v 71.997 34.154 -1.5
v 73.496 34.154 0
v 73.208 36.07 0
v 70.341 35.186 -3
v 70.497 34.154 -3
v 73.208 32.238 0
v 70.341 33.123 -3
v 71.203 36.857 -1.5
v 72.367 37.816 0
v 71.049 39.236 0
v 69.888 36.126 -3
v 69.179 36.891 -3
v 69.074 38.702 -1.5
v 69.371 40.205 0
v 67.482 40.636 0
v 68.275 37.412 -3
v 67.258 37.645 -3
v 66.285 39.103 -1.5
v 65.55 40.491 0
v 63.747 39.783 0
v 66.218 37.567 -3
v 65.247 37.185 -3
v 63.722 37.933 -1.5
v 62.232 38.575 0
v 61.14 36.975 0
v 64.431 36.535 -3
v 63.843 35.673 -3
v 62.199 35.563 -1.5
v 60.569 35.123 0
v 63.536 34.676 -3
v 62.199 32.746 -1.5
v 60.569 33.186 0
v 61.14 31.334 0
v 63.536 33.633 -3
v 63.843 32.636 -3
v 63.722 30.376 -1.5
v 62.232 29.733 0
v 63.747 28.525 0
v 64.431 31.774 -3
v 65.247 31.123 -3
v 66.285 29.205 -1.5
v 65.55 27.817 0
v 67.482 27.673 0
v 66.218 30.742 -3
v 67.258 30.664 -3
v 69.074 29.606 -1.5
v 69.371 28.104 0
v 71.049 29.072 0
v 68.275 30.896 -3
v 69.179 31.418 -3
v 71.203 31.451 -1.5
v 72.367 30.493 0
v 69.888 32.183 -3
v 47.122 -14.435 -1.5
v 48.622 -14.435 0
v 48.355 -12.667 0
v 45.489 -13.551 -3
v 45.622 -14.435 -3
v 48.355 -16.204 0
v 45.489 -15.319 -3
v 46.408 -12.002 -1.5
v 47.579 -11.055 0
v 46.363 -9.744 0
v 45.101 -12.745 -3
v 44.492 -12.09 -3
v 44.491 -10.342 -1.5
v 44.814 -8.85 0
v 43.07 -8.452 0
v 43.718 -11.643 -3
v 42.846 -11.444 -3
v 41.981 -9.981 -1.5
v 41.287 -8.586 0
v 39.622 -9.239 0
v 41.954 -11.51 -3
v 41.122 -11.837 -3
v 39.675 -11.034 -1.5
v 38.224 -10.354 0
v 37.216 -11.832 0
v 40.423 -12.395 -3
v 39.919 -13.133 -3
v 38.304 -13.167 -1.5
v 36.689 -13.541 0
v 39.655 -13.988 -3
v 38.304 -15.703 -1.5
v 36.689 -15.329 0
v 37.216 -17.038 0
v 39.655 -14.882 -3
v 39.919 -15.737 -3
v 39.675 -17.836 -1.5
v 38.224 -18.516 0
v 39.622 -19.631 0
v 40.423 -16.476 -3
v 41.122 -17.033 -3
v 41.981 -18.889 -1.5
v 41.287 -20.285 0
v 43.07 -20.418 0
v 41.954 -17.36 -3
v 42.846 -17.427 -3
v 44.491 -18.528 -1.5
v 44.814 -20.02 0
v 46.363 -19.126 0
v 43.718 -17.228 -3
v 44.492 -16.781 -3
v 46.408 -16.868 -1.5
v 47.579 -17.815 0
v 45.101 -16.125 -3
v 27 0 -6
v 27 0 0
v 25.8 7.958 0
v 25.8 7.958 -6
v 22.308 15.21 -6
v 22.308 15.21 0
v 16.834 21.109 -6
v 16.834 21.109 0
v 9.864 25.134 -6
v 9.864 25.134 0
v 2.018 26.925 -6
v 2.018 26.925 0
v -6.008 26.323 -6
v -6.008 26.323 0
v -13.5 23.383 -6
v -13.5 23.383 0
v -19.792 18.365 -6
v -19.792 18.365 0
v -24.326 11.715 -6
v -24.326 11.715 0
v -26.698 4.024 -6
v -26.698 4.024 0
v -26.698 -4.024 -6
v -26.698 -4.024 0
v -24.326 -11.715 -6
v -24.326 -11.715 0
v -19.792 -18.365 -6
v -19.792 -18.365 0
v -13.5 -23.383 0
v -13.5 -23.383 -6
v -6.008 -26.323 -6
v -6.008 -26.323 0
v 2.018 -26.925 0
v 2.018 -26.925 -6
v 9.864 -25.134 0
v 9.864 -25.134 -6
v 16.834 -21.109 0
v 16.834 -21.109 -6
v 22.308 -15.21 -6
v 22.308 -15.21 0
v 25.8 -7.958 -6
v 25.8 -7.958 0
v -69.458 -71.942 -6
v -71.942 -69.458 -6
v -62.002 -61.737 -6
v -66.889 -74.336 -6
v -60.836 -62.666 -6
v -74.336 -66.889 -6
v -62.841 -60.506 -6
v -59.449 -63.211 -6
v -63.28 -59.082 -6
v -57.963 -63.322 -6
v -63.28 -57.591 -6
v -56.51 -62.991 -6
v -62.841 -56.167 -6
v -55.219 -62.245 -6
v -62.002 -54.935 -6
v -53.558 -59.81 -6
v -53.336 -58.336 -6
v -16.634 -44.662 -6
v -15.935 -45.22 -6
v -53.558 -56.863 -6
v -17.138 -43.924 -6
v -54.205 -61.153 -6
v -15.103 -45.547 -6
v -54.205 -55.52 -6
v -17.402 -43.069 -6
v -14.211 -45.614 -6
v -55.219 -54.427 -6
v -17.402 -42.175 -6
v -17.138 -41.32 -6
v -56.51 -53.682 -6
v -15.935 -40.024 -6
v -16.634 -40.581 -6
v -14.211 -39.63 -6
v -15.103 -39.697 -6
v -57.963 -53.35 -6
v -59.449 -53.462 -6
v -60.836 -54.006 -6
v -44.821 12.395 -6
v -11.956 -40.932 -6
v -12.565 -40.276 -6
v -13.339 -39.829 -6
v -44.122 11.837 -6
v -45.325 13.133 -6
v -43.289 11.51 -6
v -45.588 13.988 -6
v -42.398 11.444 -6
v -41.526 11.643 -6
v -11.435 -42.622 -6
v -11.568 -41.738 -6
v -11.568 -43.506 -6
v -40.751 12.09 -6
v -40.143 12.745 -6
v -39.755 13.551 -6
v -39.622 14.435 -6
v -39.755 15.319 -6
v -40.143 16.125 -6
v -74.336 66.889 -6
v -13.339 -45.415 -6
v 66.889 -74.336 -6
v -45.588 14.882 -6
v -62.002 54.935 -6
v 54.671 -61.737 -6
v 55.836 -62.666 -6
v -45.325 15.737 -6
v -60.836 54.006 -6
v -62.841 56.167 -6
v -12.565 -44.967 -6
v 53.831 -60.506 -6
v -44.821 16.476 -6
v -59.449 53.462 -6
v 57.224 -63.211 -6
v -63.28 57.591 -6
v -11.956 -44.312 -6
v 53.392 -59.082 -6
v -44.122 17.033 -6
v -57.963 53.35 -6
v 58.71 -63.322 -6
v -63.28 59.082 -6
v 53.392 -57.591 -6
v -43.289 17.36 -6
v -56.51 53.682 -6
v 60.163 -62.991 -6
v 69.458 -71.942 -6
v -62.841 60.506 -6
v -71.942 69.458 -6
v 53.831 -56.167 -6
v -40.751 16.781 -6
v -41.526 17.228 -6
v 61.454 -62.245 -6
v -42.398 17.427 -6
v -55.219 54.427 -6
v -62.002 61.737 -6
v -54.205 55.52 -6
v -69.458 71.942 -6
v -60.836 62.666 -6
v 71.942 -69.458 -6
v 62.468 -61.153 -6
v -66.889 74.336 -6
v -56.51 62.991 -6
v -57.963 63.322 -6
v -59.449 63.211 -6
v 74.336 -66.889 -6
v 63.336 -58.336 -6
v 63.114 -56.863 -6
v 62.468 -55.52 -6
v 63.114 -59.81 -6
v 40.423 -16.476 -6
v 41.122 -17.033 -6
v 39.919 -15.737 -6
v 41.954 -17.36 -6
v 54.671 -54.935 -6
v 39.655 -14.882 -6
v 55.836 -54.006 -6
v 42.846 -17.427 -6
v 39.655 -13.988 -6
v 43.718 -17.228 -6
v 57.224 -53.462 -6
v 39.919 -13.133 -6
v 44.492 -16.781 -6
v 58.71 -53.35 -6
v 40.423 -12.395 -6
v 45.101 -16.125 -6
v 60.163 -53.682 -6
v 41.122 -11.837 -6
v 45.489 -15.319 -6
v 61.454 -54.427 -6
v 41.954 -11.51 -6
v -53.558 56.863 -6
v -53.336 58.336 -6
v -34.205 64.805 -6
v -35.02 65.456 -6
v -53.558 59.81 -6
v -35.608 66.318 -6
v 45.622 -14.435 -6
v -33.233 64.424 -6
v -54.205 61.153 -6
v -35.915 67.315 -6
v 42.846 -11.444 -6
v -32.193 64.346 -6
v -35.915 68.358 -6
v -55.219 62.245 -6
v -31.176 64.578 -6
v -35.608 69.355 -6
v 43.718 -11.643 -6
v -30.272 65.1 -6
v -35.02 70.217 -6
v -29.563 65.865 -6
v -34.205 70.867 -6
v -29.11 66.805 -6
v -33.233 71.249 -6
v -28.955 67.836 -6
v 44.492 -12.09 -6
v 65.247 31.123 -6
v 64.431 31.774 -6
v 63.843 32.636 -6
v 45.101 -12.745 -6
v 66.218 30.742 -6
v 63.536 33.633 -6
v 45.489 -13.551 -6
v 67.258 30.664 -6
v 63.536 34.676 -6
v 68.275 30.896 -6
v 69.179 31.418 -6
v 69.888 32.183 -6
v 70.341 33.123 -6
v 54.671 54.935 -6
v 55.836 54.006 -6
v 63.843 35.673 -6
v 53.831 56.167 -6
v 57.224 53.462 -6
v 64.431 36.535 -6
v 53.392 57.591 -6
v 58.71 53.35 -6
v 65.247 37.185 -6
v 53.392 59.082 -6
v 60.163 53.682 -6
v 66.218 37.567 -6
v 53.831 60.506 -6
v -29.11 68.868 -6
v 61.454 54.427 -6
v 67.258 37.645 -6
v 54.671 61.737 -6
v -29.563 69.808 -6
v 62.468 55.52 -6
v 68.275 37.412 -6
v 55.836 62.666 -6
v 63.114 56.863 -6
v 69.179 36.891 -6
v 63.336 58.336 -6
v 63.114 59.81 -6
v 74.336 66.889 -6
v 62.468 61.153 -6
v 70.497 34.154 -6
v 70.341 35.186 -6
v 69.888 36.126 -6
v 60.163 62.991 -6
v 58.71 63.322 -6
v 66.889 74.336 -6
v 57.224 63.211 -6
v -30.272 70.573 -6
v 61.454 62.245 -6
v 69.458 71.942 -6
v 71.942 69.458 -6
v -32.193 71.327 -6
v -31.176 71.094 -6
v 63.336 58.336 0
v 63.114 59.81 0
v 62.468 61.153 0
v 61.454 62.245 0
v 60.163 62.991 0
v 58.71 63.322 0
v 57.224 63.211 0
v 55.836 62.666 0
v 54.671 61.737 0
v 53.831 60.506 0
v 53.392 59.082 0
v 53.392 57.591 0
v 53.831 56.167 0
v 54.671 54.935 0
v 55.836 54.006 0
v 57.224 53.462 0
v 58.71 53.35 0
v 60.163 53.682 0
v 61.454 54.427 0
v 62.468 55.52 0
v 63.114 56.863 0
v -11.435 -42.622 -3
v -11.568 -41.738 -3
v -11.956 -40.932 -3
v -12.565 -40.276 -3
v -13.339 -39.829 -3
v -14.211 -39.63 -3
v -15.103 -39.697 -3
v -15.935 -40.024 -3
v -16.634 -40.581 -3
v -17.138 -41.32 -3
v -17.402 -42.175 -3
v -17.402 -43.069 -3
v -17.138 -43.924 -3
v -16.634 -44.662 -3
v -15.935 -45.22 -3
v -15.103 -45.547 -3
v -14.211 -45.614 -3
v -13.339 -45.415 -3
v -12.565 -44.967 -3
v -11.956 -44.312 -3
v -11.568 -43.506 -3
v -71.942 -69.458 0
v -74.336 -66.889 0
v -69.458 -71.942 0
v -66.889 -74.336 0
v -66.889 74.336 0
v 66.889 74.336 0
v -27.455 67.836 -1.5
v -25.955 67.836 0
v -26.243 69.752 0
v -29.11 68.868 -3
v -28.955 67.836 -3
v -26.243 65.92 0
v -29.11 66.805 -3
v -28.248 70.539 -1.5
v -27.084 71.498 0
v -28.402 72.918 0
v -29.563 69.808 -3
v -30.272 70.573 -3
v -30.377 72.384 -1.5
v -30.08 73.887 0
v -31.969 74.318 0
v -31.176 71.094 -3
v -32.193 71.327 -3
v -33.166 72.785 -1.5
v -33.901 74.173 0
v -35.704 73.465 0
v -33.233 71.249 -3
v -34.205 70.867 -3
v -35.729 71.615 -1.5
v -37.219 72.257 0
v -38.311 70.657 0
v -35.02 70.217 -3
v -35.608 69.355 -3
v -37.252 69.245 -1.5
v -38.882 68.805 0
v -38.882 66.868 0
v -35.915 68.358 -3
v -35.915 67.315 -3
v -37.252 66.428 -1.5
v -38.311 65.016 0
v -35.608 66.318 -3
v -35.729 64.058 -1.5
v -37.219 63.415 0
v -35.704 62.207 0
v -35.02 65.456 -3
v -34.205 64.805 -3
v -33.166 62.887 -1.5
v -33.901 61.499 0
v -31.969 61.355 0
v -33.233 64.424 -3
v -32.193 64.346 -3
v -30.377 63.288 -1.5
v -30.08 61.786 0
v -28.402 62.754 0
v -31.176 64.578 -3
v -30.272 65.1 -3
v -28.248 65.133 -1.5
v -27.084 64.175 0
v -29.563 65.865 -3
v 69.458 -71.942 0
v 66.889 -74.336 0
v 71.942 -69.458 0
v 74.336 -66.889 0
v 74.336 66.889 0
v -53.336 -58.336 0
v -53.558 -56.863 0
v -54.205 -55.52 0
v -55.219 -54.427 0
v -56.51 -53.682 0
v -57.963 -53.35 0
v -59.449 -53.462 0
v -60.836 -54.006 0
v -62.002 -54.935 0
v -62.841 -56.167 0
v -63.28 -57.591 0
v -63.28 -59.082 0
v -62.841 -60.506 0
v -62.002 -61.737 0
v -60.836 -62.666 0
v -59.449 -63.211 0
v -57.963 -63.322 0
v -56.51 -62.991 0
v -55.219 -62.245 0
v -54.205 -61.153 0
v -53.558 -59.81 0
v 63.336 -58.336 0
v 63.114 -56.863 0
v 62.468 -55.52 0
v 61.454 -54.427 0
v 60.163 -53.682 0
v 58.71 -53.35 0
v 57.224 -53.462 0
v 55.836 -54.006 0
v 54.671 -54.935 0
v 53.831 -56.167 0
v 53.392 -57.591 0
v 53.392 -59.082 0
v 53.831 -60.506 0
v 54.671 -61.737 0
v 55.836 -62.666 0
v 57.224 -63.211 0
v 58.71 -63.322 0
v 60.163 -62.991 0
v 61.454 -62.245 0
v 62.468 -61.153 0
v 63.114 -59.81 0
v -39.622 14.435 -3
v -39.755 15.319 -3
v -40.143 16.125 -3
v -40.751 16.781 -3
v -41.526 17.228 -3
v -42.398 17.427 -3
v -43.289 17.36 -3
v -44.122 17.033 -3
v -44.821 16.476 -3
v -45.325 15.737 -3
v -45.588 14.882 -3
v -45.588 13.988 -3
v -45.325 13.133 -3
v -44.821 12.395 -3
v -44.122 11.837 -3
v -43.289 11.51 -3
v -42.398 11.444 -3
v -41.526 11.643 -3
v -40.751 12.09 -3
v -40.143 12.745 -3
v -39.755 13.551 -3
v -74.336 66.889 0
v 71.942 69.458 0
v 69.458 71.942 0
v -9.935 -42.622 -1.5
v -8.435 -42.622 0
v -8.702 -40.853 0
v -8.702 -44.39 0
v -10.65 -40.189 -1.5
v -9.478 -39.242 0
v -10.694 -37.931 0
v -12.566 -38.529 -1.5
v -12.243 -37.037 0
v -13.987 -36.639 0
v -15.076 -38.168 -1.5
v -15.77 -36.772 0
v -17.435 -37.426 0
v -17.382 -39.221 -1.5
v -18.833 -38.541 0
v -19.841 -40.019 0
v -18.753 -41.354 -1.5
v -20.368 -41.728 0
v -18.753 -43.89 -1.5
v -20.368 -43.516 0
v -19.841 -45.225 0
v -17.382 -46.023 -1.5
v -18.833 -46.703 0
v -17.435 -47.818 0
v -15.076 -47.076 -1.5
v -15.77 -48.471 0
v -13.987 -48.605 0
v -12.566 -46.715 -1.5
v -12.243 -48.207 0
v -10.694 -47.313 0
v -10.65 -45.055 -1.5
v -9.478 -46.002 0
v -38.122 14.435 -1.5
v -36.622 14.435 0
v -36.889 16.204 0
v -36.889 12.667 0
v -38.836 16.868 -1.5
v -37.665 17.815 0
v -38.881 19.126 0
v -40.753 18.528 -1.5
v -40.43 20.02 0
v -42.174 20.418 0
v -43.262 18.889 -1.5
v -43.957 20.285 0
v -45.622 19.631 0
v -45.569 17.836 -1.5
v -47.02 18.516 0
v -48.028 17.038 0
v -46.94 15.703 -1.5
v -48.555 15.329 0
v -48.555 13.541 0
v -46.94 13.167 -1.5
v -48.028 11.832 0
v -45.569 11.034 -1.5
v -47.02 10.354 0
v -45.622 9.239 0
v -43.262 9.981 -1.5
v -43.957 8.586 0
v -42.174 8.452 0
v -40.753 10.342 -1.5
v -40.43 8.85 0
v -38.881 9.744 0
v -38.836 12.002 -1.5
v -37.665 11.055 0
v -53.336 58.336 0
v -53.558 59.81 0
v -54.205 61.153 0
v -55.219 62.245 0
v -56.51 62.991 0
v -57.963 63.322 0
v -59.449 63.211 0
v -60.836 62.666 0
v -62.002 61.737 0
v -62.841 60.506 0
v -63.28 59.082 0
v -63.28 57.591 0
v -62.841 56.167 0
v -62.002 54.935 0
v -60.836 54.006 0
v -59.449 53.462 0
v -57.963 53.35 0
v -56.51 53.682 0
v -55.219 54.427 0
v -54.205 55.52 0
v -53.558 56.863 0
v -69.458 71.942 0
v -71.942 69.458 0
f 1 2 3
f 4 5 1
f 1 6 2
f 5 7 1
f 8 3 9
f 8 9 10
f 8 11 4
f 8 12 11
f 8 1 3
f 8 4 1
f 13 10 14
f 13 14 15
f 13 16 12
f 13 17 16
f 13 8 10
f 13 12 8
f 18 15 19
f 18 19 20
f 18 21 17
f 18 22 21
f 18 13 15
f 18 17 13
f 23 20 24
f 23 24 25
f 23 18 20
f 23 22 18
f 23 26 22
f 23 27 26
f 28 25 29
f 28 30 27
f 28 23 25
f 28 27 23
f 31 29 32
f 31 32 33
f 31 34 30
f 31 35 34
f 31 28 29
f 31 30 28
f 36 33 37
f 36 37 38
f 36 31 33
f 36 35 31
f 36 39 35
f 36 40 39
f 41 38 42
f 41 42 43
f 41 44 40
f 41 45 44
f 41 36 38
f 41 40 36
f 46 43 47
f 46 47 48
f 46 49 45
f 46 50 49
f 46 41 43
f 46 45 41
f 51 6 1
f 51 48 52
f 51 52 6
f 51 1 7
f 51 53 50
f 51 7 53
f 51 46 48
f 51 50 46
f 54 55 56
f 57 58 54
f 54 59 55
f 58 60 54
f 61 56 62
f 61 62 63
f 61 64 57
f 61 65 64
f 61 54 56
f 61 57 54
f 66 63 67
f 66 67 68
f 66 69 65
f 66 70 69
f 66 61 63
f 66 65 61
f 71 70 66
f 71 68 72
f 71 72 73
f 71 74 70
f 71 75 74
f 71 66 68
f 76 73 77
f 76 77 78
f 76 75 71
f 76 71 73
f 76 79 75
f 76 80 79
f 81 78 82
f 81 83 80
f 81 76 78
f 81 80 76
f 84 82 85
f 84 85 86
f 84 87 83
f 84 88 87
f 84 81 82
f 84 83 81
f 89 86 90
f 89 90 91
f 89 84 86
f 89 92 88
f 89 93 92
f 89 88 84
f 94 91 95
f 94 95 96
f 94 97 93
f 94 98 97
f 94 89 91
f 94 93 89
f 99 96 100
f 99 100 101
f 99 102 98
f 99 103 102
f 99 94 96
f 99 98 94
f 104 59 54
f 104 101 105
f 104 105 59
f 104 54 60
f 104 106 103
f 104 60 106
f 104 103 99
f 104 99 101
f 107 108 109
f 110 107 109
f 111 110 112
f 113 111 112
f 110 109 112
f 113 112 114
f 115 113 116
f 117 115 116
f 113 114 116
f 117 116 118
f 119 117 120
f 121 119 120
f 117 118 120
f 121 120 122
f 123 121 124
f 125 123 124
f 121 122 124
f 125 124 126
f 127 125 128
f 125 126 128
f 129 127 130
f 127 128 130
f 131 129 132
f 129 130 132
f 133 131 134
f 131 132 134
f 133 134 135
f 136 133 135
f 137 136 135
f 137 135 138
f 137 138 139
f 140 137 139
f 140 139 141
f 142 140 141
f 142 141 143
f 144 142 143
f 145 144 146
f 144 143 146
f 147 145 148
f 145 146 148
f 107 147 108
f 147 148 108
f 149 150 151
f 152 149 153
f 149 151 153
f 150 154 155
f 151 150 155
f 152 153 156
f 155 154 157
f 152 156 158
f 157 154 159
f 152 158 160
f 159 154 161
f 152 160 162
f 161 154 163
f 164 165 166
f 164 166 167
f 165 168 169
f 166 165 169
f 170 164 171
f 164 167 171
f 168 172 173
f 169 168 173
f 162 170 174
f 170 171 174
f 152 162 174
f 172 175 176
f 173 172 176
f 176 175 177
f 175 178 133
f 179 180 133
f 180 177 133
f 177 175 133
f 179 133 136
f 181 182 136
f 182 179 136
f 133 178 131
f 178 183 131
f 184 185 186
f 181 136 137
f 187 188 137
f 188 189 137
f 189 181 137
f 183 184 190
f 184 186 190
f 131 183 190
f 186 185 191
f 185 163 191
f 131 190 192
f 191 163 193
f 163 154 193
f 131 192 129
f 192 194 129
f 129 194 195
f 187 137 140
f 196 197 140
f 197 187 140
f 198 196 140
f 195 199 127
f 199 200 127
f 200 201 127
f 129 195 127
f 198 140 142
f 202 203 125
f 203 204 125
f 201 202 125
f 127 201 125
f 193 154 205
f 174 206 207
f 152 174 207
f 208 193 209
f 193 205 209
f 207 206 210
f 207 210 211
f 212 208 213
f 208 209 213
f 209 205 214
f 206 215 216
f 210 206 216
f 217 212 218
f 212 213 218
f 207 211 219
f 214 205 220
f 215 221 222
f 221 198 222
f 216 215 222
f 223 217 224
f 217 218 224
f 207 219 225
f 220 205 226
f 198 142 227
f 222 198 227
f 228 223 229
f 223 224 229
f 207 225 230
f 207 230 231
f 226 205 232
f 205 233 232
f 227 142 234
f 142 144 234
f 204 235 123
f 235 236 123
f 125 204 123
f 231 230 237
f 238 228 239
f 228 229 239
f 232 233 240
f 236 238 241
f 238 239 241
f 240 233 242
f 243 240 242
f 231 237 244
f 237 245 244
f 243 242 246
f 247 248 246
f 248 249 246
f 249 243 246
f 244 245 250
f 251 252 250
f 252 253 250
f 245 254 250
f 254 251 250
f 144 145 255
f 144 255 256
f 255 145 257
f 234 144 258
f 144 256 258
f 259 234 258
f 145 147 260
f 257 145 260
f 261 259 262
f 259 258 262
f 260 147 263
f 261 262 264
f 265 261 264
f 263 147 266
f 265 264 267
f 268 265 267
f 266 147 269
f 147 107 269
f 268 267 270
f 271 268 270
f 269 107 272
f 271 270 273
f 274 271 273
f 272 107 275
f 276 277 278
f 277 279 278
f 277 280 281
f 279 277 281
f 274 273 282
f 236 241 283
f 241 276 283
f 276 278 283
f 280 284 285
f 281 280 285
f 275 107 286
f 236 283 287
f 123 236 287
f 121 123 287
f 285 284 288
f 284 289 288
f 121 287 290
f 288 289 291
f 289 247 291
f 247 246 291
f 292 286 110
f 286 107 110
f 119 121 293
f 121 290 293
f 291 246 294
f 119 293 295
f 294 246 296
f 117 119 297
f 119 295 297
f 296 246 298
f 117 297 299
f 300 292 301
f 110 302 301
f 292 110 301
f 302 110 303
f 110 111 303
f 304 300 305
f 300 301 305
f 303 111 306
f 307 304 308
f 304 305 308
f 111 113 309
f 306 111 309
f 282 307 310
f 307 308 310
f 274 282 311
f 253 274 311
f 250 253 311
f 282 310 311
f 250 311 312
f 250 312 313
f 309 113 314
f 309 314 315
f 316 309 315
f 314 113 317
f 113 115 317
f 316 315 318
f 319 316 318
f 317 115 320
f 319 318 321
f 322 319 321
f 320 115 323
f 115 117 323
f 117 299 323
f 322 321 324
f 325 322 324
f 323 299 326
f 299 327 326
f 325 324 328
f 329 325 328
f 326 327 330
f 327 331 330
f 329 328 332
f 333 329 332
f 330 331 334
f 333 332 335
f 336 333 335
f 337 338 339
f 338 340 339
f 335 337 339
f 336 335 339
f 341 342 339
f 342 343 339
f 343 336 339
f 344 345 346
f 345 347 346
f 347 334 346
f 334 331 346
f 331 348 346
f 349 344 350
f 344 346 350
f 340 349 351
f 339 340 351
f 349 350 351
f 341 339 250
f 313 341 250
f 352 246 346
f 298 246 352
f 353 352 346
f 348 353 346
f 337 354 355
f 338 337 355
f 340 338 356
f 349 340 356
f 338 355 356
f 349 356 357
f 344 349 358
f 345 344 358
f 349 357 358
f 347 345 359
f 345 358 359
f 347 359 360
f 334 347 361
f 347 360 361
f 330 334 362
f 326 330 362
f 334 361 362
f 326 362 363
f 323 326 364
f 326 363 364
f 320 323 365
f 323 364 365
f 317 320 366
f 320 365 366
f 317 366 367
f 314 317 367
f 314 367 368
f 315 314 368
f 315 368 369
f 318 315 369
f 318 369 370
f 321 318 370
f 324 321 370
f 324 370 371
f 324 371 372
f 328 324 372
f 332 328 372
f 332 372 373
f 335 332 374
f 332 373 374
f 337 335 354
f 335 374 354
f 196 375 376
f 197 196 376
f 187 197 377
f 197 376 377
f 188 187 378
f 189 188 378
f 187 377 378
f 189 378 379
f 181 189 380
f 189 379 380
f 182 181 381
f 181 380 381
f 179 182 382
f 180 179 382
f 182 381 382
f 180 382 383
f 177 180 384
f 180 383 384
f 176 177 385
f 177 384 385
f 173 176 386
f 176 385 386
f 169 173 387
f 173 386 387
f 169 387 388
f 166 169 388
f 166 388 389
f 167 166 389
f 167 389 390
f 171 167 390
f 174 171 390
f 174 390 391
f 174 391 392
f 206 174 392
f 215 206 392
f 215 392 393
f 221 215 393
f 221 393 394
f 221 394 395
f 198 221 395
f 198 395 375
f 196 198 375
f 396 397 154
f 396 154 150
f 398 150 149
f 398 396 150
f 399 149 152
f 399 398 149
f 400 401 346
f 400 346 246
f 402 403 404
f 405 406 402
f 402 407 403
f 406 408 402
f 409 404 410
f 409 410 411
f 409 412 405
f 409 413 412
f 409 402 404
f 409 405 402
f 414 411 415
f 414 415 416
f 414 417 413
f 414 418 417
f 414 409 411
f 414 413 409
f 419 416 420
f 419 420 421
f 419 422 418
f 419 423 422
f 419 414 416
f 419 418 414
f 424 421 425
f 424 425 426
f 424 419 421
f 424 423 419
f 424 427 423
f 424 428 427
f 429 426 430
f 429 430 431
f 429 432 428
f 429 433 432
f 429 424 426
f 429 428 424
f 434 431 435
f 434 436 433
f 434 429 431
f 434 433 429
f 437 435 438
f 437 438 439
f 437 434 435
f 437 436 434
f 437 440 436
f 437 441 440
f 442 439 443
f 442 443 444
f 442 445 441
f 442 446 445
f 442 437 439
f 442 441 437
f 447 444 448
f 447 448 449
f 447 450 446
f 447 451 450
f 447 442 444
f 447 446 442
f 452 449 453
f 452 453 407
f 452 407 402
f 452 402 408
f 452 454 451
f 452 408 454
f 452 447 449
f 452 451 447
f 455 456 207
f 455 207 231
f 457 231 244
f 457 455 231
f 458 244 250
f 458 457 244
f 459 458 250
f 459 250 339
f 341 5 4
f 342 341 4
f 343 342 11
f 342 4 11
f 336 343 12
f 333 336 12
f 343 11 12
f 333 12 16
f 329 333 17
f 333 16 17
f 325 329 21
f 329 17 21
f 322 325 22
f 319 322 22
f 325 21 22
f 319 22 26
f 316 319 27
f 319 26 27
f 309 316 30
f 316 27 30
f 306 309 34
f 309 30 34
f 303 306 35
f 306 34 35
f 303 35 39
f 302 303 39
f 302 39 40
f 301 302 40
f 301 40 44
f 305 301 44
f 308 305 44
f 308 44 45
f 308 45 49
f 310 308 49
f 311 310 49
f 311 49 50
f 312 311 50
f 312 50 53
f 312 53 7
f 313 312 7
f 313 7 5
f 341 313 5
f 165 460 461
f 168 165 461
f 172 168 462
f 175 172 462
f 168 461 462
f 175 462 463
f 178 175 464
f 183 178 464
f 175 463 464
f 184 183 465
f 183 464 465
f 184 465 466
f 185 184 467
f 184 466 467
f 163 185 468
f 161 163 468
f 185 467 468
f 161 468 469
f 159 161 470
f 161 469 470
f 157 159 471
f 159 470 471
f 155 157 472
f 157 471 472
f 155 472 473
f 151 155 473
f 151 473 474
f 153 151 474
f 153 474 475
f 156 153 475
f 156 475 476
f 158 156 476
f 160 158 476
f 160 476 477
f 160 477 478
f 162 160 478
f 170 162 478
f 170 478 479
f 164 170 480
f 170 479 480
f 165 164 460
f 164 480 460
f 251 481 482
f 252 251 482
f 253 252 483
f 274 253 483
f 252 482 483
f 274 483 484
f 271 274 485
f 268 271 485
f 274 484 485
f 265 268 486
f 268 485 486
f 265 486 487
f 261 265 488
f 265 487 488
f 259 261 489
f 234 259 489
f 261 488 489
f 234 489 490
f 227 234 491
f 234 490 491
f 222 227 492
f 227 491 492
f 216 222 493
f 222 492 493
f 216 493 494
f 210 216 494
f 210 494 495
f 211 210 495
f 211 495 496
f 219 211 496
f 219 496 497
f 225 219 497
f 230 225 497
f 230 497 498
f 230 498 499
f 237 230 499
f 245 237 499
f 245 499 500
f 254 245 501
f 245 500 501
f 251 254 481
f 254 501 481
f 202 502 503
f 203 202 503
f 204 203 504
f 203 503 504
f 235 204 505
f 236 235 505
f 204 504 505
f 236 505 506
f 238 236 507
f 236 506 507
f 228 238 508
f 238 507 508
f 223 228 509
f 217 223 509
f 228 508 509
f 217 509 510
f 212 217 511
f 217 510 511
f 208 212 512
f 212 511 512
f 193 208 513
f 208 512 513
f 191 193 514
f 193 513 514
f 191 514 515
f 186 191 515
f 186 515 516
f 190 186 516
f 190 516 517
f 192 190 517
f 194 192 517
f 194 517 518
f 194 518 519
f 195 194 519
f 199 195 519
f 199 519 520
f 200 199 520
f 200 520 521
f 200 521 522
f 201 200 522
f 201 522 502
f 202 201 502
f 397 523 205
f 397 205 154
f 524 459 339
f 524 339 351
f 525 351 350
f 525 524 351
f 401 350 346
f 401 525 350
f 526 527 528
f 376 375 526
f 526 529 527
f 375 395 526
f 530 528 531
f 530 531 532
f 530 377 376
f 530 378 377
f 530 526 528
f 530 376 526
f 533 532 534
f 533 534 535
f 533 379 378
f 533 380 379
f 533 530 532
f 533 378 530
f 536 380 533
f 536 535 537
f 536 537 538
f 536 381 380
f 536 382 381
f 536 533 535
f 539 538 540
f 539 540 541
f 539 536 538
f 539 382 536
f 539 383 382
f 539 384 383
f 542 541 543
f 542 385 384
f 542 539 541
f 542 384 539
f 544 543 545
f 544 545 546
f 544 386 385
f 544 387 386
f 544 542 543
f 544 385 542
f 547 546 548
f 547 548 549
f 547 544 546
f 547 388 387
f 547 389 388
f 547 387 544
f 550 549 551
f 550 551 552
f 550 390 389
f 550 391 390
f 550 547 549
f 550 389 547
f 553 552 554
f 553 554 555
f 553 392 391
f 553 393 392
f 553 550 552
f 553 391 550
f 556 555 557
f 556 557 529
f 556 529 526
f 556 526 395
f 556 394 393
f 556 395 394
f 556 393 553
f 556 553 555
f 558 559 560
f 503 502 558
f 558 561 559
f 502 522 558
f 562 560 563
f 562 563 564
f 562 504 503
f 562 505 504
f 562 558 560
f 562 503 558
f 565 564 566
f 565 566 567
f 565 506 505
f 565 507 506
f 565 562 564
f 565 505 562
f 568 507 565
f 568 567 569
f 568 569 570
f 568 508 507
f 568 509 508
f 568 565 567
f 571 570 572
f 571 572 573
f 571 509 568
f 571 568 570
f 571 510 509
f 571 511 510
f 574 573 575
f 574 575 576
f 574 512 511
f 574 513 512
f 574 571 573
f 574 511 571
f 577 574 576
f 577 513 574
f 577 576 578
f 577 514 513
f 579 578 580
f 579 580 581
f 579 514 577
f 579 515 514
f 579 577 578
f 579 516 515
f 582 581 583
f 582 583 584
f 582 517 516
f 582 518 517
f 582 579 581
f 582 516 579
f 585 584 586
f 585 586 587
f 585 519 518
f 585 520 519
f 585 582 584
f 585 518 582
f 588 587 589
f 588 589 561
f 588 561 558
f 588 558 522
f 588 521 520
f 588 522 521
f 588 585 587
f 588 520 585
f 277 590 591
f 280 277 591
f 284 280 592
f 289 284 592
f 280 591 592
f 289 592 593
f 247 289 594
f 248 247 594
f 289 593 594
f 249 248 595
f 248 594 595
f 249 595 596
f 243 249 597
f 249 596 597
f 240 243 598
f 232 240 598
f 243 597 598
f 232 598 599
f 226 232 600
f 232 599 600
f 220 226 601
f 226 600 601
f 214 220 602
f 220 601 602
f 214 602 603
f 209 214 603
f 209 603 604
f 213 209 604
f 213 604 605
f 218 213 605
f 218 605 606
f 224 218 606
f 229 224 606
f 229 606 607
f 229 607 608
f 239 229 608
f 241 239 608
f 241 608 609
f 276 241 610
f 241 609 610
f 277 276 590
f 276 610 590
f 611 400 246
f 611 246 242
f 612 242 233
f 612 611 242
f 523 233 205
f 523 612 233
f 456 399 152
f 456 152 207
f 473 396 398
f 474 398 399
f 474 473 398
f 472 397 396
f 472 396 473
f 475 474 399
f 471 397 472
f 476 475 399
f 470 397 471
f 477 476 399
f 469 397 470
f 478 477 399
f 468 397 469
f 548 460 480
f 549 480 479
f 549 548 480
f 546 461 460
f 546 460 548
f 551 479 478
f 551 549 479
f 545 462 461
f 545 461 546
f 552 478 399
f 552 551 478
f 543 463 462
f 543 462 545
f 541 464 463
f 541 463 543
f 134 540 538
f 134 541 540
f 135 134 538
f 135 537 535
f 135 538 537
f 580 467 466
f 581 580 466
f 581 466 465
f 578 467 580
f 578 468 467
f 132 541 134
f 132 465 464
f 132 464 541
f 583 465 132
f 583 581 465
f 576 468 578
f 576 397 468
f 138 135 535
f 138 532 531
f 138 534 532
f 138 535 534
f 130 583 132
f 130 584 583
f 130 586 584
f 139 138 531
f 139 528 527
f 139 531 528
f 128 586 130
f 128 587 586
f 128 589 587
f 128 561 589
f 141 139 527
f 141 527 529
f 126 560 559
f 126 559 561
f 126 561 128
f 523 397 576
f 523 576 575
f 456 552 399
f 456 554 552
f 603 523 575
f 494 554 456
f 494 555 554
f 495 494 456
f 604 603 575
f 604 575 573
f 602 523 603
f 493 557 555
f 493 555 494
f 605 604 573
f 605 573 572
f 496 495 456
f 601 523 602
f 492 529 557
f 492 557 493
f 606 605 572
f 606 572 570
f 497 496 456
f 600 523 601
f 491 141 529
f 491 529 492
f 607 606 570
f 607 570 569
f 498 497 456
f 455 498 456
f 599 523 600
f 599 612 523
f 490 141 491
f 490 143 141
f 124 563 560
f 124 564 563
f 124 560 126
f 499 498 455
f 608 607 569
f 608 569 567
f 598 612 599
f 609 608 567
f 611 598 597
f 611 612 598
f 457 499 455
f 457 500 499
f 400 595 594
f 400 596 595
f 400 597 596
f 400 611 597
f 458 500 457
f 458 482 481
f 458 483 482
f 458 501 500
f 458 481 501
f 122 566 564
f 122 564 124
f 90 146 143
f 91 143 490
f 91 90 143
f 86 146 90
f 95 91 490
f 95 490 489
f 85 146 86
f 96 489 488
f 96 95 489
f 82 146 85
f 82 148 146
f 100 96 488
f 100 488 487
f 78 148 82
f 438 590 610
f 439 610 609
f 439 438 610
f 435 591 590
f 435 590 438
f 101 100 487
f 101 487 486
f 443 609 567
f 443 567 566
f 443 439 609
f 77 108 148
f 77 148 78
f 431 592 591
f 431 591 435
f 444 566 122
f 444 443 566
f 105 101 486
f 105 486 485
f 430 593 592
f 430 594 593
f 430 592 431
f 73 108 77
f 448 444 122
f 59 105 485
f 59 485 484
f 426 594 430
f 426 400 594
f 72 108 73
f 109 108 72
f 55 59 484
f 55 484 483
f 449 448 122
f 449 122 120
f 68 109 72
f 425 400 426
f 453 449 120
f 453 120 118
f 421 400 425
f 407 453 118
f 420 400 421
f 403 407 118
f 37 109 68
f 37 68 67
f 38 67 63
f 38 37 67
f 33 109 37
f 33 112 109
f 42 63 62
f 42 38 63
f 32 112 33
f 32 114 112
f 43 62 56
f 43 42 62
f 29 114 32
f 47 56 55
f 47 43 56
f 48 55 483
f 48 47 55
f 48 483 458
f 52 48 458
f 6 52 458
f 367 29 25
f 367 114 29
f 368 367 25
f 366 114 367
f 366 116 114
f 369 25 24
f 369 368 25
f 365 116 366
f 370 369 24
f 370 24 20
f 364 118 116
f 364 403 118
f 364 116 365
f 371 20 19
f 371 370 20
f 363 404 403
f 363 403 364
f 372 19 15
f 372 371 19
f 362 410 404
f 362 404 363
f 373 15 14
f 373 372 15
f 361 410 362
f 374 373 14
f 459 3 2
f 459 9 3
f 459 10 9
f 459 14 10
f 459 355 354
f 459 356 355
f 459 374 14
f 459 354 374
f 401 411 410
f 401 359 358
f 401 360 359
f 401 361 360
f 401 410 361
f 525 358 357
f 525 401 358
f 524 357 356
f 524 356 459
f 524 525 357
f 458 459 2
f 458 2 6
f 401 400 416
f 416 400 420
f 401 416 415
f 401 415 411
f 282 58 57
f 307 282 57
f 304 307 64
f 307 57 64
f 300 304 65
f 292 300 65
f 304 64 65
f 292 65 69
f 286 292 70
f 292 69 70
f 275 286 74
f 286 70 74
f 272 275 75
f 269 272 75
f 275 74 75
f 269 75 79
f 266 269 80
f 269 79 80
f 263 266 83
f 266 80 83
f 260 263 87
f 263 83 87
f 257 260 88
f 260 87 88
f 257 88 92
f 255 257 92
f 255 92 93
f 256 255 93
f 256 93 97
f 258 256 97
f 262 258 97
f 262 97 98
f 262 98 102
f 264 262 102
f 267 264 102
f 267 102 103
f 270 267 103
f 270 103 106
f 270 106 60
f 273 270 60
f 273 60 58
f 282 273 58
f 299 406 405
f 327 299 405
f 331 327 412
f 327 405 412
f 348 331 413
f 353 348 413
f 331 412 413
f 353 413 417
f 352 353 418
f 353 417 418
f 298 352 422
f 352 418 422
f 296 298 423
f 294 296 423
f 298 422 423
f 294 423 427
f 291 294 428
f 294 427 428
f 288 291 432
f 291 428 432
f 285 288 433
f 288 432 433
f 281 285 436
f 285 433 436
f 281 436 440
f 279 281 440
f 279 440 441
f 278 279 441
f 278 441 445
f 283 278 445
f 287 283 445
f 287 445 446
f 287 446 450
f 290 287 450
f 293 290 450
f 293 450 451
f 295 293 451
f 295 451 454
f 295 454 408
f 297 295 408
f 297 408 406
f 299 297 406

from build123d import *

# Parameters (mm, degrees)
SKETCH_1_R             = 5
SKETCH_1_R_2           = 27
SM_BASE_FLANGE_1_DEPTH = 6
SKETCH_6_R             = 3.5
SKETCH_6_R_2           = 3
CUT_EXTRUDE_1_DEPTH    = 106.298498587
CHAMFER_1_SIZE         = 3


# Sheet-metal steps are written as plain solids
with BuildPart() as part:
    # Sketch 1 → Базовая кромка1 (new body)
    with BuildSketch(Plane.XY):
        with BuildLine():
            Line((74.336309448, -66.888811454), (74.336309448, 66.888811454))
            ThreePointArc((74.336309448, 66.888811454), (70.710678119, 70.710678119), (66.888811454, 74.336309448))
            Line((66.888811454, 74.336309448), (-66.888811454, 74.336309448))
            ThreePointArc((-66.888811454, 74.336309448), (-70.710678119, 70.710678119), (-74.336309448, 66.888811454))
            Line((-74.336309448, 66.888811454), (-74.336309448, -66.888811454))
            ThreePointArc((-74.336309448, -66.888811454), (-70.710678119, -70.710678119), (-66.888811454, -74.336309448))
            Line((-66.888811454, -74.336309448), (66.888811454, -74.336309448))
            ThreePointArc((66.888811454, -74.336309448), (70.710678119, -70.710678119), (74.336309448, -66.888811454))
        make_face()
        with Locations((-58.336309448, -58.336309448)):
            Circle(SKETCH_1_R, mode=Mode.SUBTRACT)
        with Locations((-58.336309448, 58.336309448)):
            Circle(SKETCH_1_R, mode=Mode.SUBTRACT)
        with Locations((58.336309448, 58.336309448)):
            Circle(SKETCH_1_R, mode=Mode.SUBTRACT)
        with Locations((58.336309448, -58.336309448)):
            Circle(SKETCH_1_R, mode=Mode.SUBTRACT)
        Circle(SKETCH_1_R_2, mode=Mode.SUBTRACT)
    extrude(amount=-SM_BASE_FLANGE_1_DEPTH)

    # Эскиз6 → Вырез-Вытянуть1 (cut, through all)
    with BuildSketch(Plane.XY):
        with Locations((-32.454521271, 67.836309448)):
            Circle(SKETCH_6_R)
        with Locations((-42.621905135, 14.435137777)):
            Circle(SKETCH_6_R_2)
        with Locations((-14.435137777, -42.621905135)):
            Circle(SKETCH_6_R_2)
        with Locations((42.621905135, -14.435137777)):
            Circle(SKETCH_6_R_2)
        with Locations((66.996590711, 34.154321301)):
            Circle(SKETCH_6_R)
    extrude(amount=-CUT_EXTRUDE_1_DEPTH, mode=Mode.SUBTRACT)

    # Фаска1
    chamfer_1_edges = [part.edges().sort_by_distance(p)[0] for p in [
        (-35.954521271, 67.836309448, 0),
        (-45.621905135, 14.435137777, 0),
        (-17.435137777, -42.621905135, 0),
        (39.621905135, -14.435137777, 0),
        (63.496590711, 34.154321301, 0),
    ]]
    chamfer(chamfer_1_edges, length=CHAMFER_1_SIZE - 0.0001)  # a hair under: the kernel refuses the full size


solid = part.part
